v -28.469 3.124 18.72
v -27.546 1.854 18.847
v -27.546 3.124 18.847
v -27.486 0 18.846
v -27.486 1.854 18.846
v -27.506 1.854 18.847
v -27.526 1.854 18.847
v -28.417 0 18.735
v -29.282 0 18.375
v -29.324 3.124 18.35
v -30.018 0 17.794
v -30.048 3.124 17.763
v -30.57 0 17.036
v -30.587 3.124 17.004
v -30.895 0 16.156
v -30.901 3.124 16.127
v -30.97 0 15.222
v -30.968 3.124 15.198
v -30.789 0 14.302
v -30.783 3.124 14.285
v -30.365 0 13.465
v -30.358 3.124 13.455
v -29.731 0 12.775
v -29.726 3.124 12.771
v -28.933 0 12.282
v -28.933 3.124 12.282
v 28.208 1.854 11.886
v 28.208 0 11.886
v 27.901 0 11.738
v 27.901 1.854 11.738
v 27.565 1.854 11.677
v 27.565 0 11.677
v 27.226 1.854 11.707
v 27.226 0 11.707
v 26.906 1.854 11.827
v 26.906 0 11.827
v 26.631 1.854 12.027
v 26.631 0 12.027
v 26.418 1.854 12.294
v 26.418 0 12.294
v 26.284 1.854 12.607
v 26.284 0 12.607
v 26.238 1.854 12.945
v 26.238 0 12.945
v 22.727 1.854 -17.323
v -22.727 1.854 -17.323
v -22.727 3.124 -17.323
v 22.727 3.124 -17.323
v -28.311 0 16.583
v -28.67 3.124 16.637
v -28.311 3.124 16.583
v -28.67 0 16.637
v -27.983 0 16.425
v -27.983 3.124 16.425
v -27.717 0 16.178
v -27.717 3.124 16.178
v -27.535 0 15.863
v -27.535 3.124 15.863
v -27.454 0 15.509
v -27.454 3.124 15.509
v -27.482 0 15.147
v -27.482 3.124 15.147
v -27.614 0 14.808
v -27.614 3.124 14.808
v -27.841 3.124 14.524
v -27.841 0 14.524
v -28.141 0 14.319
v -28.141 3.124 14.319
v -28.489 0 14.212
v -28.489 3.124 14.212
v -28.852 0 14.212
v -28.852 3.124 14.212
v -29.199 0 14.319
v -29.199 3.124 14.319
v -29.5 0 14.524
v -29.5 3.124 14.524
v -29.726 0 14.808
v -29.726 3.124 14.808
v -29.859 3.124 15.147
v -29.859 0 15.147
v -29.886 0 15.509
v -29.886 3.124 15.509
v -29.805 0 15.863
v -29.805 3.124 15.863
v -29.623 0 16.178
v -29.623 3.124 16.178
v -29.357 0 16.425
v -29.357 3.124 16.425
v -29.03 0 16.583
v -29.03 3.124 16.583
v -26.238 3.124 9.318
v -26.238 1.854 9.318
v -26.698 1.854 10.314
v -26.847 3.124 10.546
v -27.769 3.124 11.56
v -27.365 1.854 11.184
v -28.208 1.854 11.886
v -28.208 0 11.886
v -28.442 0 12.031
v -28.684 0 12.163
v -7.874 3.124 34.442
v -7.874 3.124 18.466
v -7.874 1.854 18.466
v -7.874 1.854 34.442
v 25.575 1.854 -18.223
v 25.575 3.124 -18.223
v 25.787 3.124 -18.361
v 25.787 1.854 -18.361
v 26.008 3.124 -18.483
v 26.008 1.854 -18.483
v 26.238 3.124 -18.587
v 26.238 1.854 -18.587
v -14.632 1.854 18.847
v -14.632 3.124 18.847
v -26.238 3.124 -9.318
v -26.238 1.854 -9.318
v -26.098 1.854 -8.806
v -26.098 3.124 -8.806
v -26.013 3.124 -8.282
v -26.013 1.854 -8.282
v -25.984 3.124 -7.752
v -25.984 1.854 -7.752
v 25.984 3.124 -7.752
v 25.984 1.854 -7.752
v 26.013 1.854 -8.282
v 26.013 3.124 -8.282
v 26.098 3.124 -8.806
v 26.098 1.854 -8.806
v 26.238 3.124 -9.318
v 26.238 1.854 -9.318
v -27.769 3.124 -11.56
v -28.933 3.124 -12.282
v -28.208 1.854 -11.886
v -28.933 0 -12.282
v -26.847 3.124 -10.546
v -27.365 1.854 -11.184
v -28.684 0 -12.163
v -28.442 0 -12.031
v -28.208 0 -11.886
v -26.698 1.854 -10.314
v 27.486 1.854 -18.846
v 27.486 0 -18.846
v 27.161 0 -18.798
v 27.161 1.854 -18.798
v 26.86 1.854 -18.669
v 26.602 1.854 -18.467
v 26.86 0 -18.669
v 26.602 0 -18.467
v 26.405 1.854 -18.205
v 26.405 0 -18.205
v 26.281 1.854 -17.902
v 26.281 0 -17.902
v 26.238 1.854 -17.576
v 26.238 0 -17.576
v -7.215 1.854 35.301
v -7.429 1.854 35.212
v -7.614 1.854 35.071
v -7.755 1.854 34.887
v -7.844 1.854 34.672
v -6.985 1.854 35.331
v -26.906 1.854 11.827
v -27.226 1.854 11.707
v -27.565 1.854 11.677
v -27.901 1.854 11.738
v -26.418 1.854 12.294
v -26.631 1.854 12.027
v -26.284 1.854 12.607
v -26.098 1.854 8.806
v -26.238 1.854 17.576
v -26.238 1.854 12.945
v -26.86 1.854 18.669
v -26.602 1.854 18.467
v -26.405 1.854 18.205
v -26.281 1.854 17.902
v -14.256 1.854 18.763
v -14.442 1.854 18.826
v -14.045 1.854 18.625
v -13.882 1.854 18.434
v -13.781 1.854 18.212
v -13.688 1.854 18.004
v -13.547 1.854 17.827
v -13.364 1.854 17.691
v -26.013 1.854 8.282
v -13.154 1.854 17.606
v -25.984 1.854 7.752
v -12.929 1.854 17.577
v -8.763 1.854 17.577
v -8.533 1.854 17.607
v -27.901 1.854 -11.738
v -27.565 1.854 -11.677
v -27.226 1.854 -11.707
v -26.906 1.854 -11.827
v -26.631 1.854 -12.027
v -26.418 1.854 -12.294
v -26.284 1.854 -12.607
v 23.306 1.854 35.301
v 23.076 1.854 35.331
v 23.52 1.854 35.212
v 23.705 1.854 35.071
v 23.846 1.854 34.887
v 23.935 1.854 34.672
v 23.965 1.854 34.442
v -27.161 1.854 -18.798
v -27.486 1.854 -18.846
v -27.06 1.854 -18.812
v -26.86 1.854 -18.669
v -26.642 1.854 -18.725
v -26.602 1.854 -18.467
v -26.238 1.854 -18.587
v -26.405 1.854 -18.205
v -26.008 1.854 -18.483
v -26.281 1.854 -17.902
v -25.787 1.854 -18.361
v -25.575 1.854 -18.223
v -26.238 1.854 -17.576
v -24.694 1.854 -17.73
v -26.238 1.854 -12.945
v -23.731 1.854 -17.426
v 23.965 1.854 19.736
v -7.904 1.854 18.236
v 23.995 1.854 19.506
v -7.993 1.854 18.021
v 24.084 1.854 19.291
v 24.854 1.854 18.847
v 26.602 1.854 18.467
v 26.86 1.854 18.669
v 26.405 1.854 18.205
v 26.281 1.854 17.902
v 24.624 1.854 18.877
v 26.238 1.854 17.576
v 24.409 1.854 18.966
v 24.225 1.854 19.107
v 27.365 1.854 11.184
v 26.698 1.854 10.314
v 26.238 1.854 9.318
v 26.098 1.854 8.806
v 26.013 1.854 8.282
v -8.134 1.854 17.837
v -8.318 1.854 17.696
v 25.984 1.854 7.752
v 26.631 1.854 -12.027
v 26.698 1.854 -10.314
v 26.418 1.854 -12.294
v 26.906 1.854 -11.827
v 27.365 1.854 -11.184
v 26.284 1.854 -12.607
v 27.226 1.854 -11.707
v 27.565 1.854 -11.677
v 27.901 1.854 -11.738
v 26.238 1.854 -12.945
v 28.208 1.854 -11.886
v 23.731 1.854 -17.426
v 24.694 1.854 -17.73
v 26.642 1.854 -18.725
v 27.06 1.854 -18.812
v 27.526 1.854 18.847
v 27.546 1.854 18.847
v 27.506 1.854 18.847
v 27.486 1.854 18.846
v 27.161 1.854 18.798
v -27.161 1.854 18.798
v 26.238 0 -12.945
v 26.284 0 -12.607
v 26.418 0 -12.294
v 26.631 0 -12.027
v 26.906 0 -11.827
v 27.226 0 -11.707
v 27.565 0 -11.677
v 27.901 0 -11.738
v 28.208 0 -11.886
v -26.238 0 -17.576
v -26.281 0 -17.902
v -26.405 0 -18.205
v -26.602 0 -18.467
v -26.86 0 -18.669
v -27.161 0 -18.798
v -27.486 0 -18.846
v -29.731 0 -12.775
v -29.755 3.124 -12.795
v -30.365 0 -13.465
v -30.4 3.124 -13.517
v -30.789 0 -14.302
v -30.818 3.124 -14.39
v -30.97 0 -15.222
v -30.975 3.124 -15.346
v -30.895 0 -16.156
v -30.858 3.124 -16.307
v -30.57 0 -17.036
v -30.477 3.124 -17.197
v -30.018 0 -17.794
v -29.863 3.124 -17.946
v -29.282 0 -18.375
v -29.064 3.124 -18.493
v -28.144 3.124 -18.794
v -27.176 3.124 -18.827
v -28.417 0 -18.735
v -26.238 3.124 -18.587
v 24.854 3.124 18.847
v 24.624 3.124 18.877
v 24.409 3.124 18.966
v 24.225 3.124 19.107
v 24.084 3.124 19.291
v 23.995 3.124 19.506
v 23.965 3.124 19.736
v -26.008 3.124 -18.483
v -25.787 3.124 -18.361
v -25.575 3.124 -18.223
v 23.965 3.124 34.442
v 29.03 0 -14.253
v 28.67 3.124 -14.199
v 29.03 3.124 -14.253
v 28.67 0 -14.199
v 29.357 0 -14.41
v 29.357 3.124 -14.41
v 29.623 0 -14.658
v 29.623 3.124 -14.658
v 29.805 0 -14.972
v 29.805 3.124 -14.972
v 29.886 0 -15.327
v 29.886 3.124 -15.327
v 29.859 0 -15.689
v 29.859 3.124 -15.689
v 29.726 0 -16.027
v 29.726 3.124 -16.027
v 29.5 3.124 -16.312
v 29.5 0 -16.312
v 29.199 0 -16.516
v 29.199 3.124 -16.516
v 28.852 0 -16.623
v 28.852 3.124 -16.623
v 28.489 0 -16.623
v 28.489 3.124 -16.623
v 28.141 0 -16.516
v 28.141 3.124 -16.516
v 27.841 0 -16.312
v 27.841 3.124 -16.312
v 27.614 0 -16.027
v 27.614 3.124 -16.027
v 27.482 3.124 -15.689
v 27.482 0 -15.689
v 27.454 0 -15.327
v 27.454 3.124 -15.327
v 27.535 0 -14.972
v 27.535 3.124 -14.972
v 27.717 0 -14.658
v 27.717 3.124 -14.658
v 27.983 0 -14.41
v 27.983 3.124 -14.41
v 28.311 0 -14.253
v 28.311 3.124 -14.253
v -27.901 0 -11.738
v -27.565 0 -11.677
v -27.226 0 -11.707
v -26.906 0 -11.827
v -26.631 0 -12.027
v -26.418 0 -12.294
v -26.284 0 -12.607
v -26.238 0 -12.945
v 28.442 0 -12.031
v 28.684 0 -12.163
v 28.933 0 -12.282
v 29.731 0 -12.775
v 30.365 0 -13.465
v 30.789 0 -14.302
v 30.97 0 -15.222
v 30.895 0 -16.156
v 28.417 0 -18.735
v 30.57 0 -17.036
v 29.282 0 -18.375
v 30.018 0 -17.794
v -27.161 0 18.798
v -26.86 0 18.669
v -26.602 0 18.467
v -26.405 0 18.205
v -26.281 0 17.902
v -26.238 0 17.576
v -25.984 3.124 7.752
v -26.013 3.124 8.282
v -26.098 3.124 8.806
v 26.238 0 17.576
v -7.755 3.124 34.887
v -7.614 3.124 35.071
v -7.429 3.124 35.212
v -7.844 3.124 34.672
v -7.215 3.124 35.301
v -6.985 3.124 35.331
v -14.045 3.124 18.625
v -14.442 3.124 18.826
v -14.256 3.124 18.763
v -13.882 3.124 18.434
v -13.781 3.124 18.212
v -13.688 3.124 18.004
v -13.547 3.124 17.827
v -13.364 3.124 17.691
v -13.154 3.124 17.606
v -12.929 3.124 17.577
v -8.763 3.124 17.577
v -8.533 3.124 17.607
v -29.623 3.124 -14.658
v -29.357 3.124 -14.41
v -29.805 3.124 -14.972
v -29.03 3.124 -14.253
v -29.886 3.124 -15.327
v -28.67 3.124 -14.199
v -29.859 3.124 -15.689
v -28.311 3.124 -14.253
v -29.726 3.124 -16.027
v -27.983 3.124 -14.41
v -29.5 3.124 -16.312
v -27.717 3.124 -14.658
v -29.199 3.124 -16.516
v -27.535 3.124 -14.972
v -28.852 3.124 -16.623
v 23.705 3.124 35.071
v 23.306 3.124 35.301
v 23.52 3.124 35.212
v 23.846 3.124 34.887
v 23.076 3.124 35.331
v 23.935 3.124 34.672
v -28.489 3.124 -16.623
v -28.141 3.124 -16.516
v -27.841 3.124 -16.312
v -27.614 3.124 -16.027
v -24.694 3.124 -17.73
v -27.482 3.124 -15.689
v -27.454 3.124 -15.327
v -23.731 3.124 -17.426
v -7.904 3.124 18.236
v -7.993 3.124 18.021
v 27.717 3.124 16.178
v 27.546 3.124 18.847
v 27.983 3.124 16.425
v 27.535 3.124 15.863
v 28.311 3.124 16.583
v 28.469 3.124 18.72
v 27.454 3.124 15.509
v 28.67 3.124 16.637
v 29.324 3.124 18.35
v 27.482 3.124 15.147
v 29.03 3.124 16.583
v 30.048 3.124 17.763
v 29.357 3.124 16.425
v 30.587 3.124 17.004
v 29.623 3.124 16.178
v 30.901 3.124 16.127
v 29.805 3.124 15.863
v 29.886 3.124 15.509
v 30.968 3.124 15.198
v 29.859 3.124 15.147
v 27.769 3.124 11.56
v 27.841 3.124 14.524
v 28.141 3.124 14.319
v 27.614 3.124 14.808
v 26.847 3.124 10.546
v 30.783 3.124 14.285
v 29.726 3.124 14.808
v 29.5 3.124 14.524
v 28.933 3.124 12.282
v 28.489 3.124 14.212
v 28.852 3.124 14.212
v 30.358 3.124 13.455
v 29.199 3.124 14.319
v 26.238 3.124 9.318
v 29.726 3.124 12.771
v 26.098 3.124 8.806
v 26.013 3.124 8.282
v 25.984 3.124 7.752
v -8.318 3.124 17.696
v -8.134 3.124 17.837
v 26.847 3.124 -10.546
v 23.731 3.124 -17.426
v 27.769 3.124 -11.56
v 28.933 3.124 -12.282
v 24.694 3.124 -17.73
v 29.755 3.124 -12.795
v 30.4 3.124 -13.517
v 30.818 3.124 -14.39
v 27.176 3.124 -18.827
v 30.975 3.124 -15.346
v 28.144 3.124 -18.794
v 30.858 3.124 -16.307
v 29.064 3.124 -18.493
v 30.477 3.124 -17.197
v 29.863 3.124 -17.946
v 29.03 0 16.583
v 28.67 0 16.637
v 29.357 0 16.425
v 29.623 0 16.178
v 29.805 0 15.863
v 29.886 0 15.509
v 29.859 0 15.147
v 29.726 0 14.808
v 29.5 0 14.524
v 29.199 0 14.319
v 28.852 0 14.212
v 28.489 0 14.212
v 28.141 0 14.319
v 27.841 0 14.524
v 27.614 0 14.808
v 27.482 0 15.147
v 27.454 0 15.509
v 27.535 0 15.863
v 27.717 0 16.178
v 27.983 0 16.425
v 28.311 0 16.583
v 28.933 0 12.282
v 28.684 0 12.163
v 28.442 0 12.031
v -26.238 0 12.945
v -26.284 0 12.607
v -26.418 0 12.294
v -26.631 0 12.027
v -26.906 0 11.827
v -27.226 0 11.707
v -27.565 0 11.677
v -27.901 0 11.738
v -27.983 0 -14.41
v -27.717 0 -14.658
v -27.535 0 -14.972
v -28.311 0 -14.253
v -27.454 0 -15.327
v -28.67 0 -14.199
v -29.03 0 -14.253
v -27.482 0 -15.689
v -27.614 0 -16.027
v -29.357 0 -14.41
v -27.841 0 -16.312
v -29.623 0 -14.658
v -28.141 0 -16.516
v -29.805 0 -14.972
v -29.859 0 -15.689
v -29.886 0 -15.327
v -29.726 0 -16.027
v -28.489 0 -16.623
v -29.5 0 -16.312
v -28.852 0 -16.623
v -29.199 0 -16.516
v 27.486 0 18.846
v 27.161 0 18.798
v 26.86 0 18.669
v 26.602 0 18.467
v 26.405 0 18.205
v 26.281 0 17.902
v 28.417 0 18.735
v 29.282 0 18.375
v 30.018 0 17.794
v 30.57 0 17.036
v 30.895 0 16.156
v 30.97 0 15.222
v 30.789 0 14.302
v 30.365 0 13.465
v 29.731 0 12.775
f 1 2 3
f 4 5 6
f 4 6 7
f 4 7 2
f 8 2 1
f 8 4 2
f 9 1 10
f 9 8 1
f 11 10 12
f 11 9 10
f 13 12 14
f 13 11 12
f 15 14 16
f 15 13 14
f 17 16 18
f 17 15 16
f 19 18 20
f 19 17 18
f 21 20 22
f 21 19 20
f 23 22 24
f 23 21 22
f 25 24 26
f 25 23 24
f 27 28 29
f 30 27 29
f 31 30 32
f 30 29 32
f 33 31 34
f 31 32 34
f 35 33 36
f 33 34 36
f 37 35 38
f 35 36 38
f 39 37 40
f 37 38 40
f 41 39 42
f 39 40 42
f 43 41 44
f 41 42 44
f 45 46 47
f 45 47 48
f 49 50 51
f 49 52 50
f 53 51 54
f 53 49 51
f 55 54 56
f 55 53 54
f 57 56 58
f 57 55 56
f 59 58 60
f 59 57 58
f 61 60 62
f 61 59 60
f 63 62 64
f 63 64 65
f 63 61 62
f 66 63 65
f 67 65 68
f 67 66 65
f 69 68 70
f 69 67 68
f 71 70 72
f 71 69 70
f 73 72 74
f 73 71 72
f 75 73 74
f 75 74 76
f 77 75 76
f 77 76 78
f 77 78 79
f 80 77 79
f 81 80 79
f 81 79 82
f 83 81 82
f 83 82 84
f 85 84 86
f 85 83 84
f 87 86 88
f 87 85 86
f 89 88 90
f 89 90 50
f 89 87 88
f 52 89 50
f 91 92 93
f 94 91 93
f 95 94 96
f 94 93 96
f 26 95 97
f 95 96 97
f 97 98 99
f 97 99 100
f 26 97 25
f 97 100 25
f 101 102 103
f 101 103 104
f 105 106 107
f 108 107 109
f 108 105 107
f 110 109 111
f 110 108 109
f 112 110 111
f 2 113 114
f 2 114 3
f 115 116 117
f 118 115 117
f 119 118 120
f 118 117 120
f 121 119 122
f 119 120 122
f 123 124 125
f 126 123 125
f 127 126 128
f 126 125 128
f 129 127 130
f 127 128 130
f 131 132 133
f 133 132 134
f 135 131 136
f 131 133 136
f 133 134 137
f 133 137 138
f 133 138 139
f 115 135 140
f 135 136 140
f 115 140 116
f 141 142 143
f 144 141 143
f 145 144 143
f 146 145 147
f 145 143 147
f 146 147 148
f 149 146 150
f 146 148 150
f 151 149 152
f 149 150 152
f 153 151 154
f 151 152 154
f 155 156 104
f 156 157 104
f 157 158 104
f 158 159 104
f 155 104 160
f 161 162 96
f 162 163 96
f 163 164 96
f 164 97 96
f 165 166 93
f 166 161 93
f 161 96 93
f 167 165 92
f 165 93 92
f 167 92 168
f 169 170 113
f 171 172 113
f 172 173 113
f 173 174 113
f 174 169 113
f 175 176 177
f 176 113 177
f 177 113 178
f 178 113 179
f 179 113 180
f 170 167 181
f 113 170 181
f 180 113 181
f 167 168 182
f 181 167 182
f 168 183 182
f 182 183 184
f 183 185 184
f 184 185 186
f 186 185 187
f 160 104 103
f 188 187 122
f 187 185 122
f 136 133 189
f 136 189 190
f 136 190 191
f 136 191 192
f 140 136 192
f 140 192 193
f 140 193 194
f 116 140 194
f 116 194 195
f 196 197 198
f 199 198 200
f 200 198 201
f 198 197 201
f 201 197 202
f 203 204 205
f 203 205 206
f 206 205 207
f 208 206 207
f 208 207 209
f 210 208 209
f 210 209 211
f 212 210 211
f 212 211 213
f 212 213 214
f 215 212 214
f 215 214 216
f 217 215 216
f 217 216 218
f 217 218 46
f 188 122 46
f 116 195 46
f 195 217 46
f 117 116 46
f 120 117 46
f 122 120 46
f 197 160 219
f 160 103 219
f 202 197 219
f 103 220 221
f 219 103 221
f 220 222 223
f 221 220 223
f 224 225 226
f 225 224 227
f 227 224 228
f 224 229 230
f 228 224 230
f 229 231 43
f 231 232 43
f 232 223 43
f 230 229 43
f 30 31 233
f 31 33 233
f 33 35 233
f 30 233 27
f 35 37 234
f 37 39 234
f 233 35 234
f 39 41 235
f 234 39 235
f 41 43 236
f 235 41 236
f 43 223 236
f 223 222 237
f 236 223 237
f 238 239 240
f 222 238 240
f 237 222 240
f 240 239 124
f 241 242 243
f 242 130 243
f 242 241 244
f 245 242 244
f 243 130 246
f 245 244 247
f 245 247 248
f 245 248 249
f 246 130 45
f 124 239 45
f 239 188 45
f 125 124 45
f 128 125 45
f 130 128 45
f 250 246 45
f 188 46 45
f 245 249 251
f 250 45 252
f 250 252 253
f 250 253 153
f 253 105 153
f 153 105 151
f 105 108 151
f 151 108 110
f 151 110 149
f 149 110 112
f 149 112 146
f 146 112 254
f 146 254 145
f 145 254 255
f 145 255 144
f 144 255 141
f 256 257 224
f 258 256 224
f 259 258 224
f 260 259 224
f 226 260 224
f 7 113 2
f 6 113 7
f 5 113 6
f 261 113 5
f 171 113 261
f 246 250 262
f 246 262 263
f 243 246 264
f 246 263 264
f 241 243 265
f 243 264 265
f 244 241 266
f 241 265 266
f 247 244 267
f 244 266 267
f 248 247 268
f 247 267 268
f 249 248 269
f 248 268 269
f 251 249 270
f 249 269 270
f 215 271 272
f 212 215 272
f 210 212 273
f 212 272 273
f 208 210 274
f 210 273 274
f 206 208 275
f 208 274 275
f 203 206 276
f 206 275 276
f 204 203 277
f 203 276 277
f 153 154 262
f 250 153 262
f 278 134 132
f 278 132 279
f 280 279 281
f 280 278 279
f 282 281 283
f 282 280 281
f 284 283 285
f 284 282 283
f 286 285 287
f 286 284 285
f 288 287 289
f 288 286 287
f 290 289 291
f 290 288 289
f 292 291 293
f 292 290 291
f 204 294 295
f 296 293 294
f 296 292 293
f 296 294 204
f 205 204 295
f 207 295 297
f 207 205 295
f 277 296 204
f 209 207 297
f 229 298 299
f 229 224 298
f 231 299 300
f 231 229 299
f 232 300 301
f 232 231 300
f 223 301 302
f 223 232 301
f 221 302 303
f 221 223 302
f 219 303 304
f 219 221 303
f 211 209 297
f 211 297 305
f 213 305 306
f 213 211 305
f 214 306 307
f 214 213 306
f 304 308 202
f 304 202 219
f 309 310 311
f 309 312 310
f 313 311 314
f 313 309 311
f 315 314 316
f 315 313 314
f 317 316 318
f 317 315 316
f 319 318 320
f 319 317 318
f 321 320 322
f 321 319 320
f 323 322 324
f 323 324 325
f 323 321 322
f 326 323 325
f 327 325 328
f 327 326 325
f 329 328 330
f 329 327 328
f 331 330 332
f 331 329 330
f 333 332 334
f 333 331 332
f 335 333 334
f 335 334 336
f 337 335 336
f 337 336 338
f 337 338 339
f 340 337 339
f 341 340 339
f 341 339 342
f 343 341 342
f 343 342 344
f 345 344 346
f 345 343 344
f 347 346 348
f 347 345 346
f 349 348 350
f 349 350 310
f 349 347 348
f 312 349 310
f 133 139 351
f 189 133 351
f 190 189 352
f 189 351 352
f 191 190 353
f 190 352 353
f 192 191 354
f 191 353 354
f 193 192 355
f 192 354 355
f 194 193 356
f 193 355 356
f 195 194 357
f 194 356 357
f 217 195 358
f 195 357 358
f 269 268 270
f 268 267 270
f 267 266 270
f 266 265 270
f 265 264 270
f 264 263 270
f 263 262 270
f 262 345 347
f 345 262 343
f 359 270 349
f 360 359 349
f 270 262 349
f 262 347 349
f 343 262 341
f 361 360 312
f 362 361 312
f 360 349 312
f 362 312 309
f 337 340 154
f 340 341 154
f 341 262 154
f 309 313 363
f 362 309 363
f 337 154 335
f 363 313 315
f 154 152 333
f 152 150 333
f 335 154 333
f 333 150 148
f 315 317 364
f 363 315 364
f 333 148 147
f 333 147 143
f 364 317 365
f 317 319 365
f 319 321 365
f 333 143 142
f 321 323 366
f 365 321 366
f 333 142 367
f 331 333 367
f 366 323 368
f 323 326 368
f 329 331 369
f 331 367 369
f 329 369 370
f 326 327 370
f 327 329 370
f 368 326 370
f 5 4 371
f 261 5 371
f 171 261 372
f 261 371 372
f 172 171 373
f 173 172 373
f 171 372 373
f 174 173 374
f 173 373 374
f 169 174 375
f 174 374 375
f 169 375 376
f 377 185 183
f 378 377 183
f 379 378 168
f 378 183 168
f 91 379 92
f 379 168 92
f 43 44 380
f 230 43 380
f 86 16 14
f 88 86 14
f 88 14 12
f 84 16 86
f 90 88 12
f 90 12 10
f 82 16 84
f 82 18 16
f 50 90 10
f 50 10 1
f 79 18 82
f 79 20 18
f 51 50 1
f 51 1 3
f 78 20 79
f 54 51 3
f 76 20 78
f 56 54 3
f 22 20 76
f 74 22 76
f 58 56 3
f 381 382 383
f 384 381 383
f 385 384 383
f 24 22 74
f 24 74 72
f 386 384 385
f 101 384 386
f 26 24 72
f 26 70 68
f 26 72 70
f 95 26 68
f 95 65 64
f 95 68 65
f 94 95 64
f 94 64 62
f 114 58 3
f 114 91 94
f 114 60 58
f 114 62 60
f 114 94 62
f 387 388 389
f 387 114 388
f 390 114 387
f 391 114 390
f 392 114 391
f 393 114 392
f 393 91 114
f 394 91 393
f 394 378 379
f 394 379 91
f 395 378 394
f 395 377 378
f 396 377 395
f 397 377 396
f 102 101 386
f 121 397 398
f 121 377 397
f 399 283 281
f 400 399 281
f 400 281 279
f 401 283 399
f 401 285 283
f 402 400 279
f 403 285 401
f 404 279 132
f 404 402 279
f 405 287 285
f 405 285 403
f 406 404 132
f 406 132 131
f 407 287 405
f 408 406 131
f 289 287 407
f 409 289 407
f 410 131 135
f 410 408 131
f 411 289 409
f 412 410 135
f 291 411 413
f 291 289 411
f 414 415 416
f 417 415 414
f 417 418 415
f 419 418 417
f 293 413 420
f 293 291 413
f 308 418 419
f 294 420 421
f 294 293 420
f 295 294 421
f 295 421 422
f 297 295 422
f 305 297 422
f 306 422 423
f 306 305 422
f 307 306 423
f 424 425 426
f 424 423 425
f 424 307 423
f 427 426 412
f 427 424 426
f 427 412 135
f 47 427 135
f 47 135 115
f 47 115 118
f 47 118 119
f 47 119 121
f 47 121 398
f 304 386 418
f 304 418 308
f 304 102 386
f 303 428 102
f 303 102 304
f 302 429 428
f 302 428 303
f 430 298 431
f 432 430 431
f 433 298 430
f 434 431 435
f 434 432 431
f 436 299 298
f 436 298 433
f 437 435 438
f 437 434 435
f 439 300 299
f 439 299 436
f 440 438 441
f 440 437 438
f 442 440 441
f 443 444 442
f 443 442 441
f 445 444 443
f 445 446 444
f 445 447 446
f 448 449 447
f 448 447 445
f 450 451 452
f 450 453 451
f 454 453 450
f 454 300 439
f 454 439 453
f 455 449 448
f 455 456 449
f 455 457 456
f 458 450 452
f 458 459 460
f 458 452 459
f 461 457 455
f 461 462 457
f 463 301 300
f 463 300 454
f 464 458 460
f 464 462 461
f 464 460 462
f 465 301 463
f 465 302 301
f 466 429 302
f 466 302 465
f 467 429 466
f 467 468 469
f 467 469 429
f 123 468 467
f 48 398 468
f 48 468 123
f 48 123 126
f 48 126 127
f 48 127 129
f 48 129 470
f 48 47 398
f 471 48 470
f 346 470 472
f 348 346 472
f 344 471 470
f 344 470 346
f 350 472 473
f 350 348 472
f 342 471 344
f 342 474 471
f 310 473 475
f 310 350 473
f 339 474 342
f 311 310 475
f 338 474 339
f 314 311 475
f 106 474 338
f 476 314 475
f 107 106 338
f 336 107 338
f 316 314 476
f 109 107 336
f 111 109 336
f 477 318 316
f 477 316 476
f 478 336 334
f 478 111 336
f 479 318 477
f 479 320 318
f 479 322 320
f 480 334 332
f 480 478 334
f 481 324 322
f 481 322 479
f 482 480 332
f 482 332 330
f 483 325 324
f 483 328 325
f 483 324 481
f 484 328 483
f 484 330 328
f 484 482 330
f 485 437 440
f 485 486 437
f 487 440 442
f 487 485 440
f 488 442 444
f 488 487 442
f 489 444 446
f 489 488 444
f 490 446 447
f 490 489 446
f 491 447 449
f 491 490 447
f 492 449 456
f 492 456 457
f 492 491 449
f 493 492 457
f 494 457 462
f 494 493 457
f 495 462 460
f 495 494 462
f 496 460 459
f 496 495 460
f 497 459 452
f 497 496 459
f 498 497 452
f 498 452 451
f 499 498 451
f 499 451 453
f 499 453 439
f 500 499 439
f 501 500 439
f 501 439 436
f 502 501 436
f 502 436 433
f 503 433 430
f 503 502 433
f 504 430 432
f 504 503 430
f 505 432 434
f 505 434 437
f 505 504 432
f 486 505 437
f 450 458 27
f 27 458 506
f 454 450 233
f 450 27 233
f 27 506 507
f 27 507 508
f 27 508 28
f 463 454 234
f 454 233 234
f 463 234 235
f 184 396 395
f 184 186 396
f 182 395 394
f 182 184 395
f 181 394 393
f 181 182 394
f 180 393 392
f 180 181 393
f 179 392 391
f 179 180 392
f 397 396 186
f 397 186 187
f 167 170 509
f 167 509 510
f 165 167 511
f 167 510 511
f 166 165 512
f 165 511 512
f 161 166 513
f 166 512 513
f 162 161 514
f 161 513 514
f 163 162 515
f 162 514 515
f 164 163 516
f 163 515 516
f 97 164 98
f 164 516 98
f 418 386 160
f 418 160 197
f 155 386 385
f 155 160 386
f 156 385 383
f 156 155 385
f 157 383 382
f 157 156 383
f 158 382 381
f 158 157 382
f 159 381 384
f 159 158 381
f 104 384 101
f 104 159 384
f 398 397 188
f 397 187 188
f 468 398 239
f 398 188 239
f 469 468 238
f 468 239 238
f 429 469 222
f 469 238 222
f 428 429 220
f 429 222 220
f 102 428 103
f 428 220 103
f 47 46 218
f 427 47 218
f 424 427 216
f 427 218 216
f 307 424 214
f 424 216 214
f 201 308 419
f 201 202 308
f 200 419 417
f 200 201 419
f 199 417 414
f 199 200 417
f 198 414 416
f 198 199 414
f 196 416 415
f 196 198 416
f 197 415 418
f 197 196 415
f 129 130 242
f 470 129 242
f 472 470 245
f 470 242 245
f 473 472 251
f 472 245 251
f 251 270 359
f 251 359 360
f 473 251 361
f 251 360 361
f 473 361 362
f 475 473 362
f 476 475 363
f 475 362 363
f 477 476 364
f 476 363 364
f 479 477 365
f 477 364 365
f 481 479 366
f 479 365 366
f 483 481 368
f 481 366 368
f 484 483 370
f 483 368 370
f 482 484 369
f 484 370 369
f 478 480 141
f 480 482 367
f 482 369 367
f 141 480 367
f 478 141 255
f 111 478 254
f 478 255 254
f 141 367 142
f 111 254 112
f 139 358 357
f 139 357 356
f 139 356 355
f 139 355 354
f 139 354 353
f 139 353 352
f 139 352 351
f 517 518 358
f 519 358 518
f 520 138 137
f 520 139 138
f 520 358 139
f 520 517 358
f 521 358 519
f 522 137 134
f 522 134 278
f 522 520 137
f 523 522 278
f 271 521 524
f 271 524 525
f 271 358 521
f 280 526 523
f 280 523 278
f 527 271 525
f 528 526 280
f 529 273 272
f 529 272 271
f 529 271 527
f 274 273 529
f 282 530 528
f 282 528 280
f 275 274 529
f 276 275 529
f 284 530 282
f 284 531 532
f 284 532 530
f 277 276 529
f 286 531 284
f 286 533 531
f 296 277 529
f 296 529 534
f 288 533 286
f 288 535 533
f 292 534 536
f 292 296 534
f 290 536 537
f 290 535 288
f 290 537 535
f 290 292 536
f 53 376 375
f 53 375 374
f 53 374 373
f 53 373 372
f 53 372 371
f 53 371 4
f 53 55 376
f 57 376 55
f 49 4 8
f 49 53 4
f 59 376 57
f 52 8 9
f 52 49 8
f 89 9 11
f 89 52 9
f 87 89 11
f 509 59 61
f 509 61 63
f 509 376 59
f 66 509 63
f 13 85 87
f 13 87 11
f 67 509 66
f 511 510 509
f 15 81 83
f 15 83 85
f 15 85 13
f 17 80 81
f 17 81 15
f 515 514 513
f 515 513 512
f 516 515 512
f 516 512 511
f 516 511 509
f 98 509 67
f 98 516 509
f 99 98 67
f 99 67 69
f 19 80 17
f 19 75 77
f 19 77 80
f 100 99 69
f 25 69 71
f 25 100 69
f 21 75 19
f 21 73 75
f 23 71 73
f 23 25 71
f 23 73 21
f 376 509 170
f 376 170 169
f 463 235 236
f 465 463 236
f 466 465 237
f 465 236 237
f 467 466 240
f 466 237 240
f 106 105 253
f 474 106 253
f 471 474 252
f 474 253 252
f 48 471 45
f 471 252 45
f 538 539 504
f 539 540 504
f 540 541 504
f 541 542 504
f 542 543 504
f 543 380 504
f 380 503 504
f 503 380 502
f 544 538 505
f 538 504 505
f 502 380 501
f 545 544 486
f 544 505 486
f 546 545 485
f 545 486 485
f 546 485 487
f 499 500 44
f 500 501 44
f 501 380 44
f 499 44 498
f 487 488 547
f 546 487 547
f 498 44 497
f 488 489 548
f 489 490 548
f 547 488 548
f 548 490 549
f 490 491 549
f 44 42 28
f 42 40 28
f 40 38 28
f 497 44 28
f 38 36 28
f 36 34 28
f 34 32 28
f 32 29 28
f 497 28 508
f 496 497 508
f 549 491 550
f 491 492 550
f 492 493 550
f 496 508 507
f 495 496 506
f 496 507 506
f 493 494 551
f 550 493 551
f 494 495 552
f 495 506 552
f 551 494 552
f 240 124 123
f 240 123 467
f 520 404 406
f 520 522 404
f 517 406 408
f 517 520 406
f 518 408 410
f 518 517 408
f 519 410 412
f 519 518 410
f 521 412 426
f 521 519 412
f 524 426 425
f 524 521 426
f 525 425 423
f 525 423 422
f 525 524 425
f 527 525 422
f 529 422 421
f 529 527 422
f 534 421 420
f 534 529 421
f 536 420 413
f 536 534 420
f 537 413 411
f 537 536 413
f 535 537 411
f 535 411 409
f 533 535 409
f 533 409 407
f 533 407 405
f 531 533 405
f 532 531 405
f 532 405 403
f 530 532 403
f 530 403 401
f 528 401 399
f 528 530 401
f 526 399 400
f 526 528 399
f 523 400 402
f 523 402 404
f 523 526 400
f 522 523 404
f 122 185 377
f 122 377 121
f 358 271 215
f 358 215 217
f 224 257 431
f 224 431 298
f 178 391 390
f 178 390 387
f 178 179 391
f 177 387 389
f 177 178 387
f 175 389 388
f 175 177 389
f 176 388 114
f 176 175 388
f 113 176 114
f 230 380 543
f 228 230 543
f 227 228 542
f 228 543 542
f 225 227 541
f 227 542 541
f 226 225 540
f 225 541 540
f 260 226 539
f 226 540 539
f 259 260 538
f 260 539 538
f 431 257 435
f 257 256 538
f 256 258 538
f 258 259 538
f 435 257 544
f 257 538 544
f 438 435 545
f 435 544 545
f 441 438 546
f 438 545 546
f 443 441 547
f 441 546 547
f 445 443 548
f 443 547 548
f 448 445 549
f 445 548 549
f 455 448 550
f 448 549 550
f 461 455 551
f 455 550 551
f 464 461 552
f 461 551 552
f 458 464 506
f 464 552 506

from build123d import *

# Parameters (mm, degrees)
SKETCH1_R             = 1.2192
BOSS_EXTRUDE1_DEPTH   = 3.1242
BOSS_EXTRUDE1_2_DEPTH = 3.1242
BOSS_EXTRUDE1_3_DEPTH = 3.1242
BOSS_EXTRUDE1_4_DEPTH = 3.1242
BOSS_EXTRUDE2_START   = -1.27
SKETCH2_R             = 1.2192
BOSS_EXTRUDE2_DEPTH   = 1.27
SKETCH4_W             = 5.9436
SKETCH4_H             = 1.27
CUT_EXTRUDE1_DEPTH    = 1.27
FILLET1_DEPTH         = 3.1242
FILLET1_START         = 1.8542
FILLET1_2_DEPTH       = 1.27
BOSS_EXTRUDE3_DEPTH   = 1.27
FILLET2_R             = 0.889
FILLET3_R             = 0.889
FILLET5_R             = 1.27


with BuildPart() as part:
    # Sketch1 → Boss-Extrude1 (new body)
    with BuildSketch(Plane(origin=(0, 0, 0), x_dir=(1, 0, 0), z_dir=(0, 1, 0))):
        with BuildLine():
            Line((26.2382, 18.587486955), (26.2382, 12.248113045))
            ThreePointArc((26.2382, 12.248113045), (30.9753, 15.4178), (26.2382, 18.587486955))
        make_face()
        with Locations(Location((28.67025, 15.4178, 0), (0, 0, 270))):
            Circle(SKETCH1_R, mode=Mode.SUBTRACT)
    extrude(amount=BOSS_EXTRUDE1_DEPTH)



with BuildPart() as body_2:
    # Sketch1 → Boss-Extrude1 2 (new body)
    with BuildSketch(Plane(origin=(0, 0, 0), x_dir=(1, 0, 0), z_dir=(0, 1, 0))):
        with BuildLine():
            Line((-26.2382, 18.587486955), (-26.2382, 12.248113045))
            ThreePointArc((-26.2382, 12.248113045), (-30.9753, 15.4178), (-26.2382, 18.587486955))
        make_face()
        with Locations(Location((-28.67025, 15.4178, 0), (0, 0, 270))):
            Circle(SKETCH1_R, mode=Mode.SUBTRACT)
    extrude(amount=BOSS_EXTRUDE1_2_DEPTH)


with BuildPart() as body_3:
    # Sketch1 → Boss-Extrude1 3 (new body)
    with BuildSketch(Plane(origin=(0, 0, 0), x_dir=(1, 0, 0), z_dir=(0, 1, 0))):
        with BuildLine():
            Line((26.2382, -12.248113045), (26.2382, -18.587486955))
            ThreePointArc((26.2382, -18.587486955), (30.9753, -15.4178), (26.2382, -12.248113045))
        make_face()
        with Locations(Location((28.67025, -15.4178, 0), (0, 0, 270))):
            Circle(SKETCH1_R, mode=Mode.SUBTRACT)
    extrude(amount=BOSS_EXTRUDE1_3_DEPTH)


with BuildPart() as body_4:
    # Sketch1 → Boss-Extrude1 4 (new body)
    with BuildSketch(Plane(origin=(0, 0, 0), x_dir=(1, 0, 0), z_dir=(0, 1, 0))):
        with BuildLine():
            Line((-26.2382, -12.248113045), (-26.2382, -18.587486955))
            ThreePointArc((-26.2382, -18.587486955), (-30.9753, -15.4178), (-26.2382, -12.248113045))
        make_face()
        with Locations(Location((-28.67025, -15.4178, 0), (0, 0, 270))):
            Circle(SKETCH1_R, mode=Mode.SUBTRACT)
    extrude(amount=BOSS_EXTRUDE1_4_DEPTH)


with BuildPart() as part_1:
    add(part.part)

    add(body_2.part)  # Boss-Extrude2 merges body 2

    add(body_3.part)  # Boss-Extrude2 merges body 3

    add(body_4.part)  # Boss-Extrude2 merges body 4
    # Sketch2 → Boss-Extrude2 (add)
    with BuildSketch(Plane(origin=(0, 3.1242, 0), x_dir=(1, 0, 0), z_dir=(0, 1, 0)).offset(BOSS_EXTRUDE2_START)):
        with BuildLine():
            Line((-24.695157071, 17.3228), (24.695157071, 17.3228))
            ThreePointArc((24.695157071, 17.3228), (30.864949116, 16.280707319), (25.9842, 12.365278978))
            Line((25.9842, 12.365278978), (25.9842, -12.365278978))
            ThreePointArc((25.9842, -12.365278978), (30.879851828, -14.614386528), (27.5463, -18.8468))
            Line((27.5463, -18.8468), (-27.5463, -18.8468))
            ThreePointArc((-27.5463, -18.8468), (-30.879851828, -14.614386528), (-25.9842, -12.365278978))
            Line((-25.9842, -12.365278978), (-25.9842, 12.365278978))
            ThreePointArc((-25.9842, 12.365278978), (-30.864949116, 16.280707319), (-24.695157071, 17.3228))
        make_face()
        with Locations(Location((28.67025, -15.4178, 0), (0, 0, 270))):
            Circle(SKETCH2_R, mode=Mode.SUBTRACT)
        with Locations(Location((28.67025, 15.4178, 0), (0, 0, 270))):
            Circle(SKETCH2_R, mode=Mode.SUBTRACT)
        with Locations(Location((-28.67025, 15.4178, 0), (0, 0, 270))):
            Circle(SKETCH2_R, mode=Mode.SUBTRACT)
        with Locations(Location((-28.67025, -15.4178, 0), (0, 0, 270))):
            Circle(SKETCH2_R, mode=Mode.SUBTRACT)
    extrude(amount=BOSS_EXTRUDE2_DEPTH)

    # Sketch4 → Cut-Extrude1 (cut)
    with BuildSketch(Plane(origin=(0, 3.1242, 0), x_dir=(1, 0, 0), z_dir=(0, 1, 0))):
        with Locations((-10.8458, -18.2118)):
            Rectangle(SKETCH4_W, SKETCH4_H)
    extrude(amount=-CUT_EXTRUDE1_DEPTH, mode=Mode.SUBTRACT)

    # Fillet1: read off the stored shape, not the designer's step
    # Fillet1 outline → Fillet1 (add)
    with BuildSketch(Plane(origin=(0, 0, 0), x_dir=(1, 0, 0), z_dir=(0, 1, 0))):
        with BuildLine():
            Line((26.2382, 12.248113045), (26.2382, 9.318072184))
            ThreePointArc((26.2382, 9.318072184), (27.272818982, 11.08465566), (28.933486364, 12.281918148))
            ThreePointArc((28.933486364, 12.281918148), (27.58930418, 11.989069675), (26.2382, 12.248113045))
        make_face()
        with BuildLine():
            ThreePointArc((28.933486364, -12.281918148), (27.272818982, -11.08465566), (26.2382, -9.318072184))
            Line((26.2382, -9.318072184), (26.2382, -12.248113045))
            ThreePointArc((26.2382, -12.248113045), (27.58930418, -11.989069675), (28.933486364, -12.281918148))
        make_face()
        with BuildLine():
            Line((-26.2382, 9.318072184), (-26.2382, 12.248113045))
            ThreePointArc((-26.2382, 12.248113045), (-27.58930418, 11.989069675), (-28.933486364, 12.281918148))
            ThreePointArc((-28.933486364, 12.281918148), (-27.272818982, 11.08465566), (-26.2382, 9.318072184))
        make_face()
        with BuildLine():
            Line((-26.2382, -12.248113045), (-26.2382, -9.318072184))
            ThreePointArc((-26.2382, -9.318072184), (-27.272818982, -11.08465566), (-28.933486364, -12.281918148))
            ThreePointArc((-28.933486364, -12.281918148), (-27.58930418, -11.989069675), (-26.2382, -12.248113045))
        make_face()
    extrude(amount=FILLET1_DEPTH)

    # Fillet1 2 outline → Fillet1 2 (add)
    with BuildSketch(Plane(origin=(0, 0, 0), x_dir=(1, 0, 0), z_dir=(0, 1, 0)).offset(FILLET1_START)):
        with BuildLine():
            ThreePointArc((25.9842, 7.752311027), (26.048112355, 8.545425773), (26.2382, 9.318072184))
            Line((26.2382, 9.318072184), (26.2382, 12.248113045))
            ThreePointArc((26.2382, 12.248113045), (26.110004775, 12.304104924), (25.9842, 12.365278978))
            Line((25.9842, 12.365278978), (25.9842, 7.752311027))
        make_face()
        with BuildLine():
            ThreePointArc((26.2382, -9.318072184), (26.048112355, -8.545425773), (25.9842, -7.752311027))
            Line((25.9842, -7.752311027), (25.9842, -12.365278978))
            ThreePointArc((25.9842, -12.365278978), (26.110004775, -12.304104924), (26.2382, -12.248113045))
            Line((26.2382, -12.248113045), (26.2382, -9.318072184))
        make_face()
        with BuildLine():
            Line((-25.9842, -12.365278978), (-25.9842, -7.752311027))
            ThreePointArc((-25.9842, -7.752311027), (-26.048112355, -8.545425773), (-26.2382, -9.318072184))
            Line((-26.2382, -9.318072184), (-26.2382, -12.248113045))
            ThreePointArc((-26.2382, -12.248113045), (-26.110004775, -12.304104924), (-25.9842, -12.365278978))
        make_face()
        with BuildLine():
            Line((-24.695157071, 17.3228), (-22.726988846, 17.3228))
            ThreePointArc((-22.726988846, 17.3228), (-24.220374536, 17.553299795), (-25.574763619, 18.223345455))
            ThreePointArc((-25.574763619, 18.223345455), (-25.093280542, 17.813783418), (-24.695157071, 17.3228))
        make_face()
        with BuildLine():
            ThreePointArc((24.695157071, 17.3228), (25.093280542, 17.813783418), (25.574763619, 18.223345455))
            ThreePointArc((25.574763619, 18.223345455), (24.220374536, 17.553299795), (22.726988846, 17.3228))
            Line((22.726988846, 17.3228), (24.695157071, 17.3228))
        make_face()
        with BuildLine():
            ThreePointArc((-25.9842, 12.365278978), (-26.110004775, 12.304104924), (-26.2382, 12.248113045))
            Line((-26.2382, 12.248113045), (-26.2382, 9.318072184))
            ThreePointArc((-26.2382, 9.318072184), (-26.048112355, 8.545425773), (-25.9842, 7.752311027))
            Line((-25.9842, 7.752311027), (-25.9842, 12.365278978))
        make_face()
    extrude(amount=FILLET1_2_DEPTH)

    # Sketch7 → Boss-Extrude3 (add)
    with BuildSketch(Plane(origin=(0, 3.1242, 0), x_dir=(1, 0, 0), z_dir=(0, 1, 0))):
        Polygon((-7.874, -25.0444), (-7.874, -35.3314), (23.9649, -35.3314), (23.9649, -25.0444), (23.9649, -18.8468), (-7.874, -18.8468), align=None)
    extrude(amount=-BOSS_EXTRUDE3_DEPTH)

    # Fillet2
    fillet2_edges = [part_1.edges().sort_by_distance(p)[0] for p in [
        (-13.8176, 2.4892, 17.5768),
        (-7.874, 2.4892, 17.5768),
        (23.9649, 2.4892, 18.8468),
    ]]
    fillet(fillet2_edges, radius=FILLET2_R)

    # Fillet3
    fillet3_edges = [part_1.edges().sort_by_distance(p)[0] for p in [
        (-13.8176, 2.4892, 18.8468),
        (23.9649, 2.4892, 35.3314),
        (-7.874, 2.4892, 35.3314),
    ]]
    fillet(fillet3_edges, radius=FILLET3_R)

    # Fillet5
    # the kernel refuses this fillet: 1.27 mm, written as the material it takes off along each edge
    with BuildSketch(Plane(origin=(26.2382, -9.068202779, -9.318072184), x_dir=(0, 0, -1), z_dir=(0, 1, 0)), Plane(origin=(-26.2382, -9.068202779, 9.318072184), x_dir=(0, 0, 1), z_dir=(0, 1, 0))) as fillet5_piece_1:
        with BuildLine():
            CenterArc((3.627281111, -1.27), FILLET5_R, 90, 123.437045448)
            ThreePointArc((2.567476567, -1.969795919), (1.449146976, -0.769300527), (0, 0))
            Line((0, 0), (3.627281111, 0))
        make_face()
    extrude(amount=10.922402779, mode=Mode.SUBTRACT)
    with BuildSketch(Plane(origin=(26.2382, -9.068202779, 9.318072184), x_dir=(0, 0, 1), z_dir=(0, 1, 0)), Plane(origin=(-26.2382, -9.068202779, -9.318072184), x_dir=(0, 0, -1), z_dir=(0, 1, 0))) as fillet5_piece_2:
        with BuildLine():
            CenterArc((3.627281111, 1.27), FILLET5_R, 146.562954552, 123.437045448)
            ThreePointArc((2.567476567, 1.969795919), (1.449146976, 0.769300527), (0, 0))
            Line((0, 0), (3.627281111, 0))
        make_face()
    extrude(amount=10.922402779, mode=Mode.SUBTRACT)
    with BuildSketch(Plane(origin=(26.2382, -3.185360081, -18.587486955), x_dir=(0, 0, 1), z_dir=(0, 1, 0))) as fillet5_piece_3:
        with BuildLine():
            CenterArc((1.011023157, 1.27), FILLET5_R, 181.011154478, 88.988845522)
            ThreePointArc((-0.258779077, 1.247588235), (-0.187845593, 0.61166896), (0, 0))
            Line((0, 0), (1.011023157, 0))
        make_face()
    extrude(amount=5.039560081, mode=Mode.SUBTRACT)
    with BuildSketch(Plane(origin=(-26.2382, -3.185360081, 18.587486955), x_dir=(-0.9791579315799205, 0, 0.20310033240773342), z_dir=(0, 1, 0))) as fillet5_piece_4:
        with BuildLine():
            CenterArc((1.038191434, -1.247888766), FILLET5_R, 79.292837609, 88.988845522)
            Line((-0.205339139, -0.989951343), (0, 0))
            ThreePointArc((0, 0), (0.637072016, 0.059700333), (1.274144032, 0))
        make_face()
    extrude(amount=5.039560081, mode=Mode.SUBTRACT)
    with BuildSketch(Plane(origin=(-26.2382, -3.185360081, -18.587486955), x_dir=(0, 0, 1), z_dir=(0, 1, 0))) as fillet5_piece_5:
        with BuildLine():
            CenterArc((1.011023157, -1.27), FILLET5_R, 90, 88.988845522)
            ThreePointArc((-0.258779077, -1.247588235), (-0.187845593, -0.61166896), (0, 0))
            Line((0, 0), (1.011023157, 0))
        make_face()
    extrude(amount=5.039560081, mode=Mode.SUBTRACT)
    with BuildSketch(Plane(origin=(26.2382, -3.185360081, 18.587486955), x_dir=(0.9791579315799218, 0, 0.2031003324077264), z_dir=(0, 1, 0))) as fillet5_piece_6:
        with BuildLine():
            CenterArc((1.038191434, 1.247888766), FILLET5_R, 191.718316869, 88.988845522)
            Line((-0.205339139, 0.989951343), (0, 0))
            ThreePointArc((0, 0), (0.637072016, -0.059700333), (1.274144032, 0))
        make_face()
    extrude(amount=5.039560081, mode=Mode.SUBTRACT)


solid = part_1.part
